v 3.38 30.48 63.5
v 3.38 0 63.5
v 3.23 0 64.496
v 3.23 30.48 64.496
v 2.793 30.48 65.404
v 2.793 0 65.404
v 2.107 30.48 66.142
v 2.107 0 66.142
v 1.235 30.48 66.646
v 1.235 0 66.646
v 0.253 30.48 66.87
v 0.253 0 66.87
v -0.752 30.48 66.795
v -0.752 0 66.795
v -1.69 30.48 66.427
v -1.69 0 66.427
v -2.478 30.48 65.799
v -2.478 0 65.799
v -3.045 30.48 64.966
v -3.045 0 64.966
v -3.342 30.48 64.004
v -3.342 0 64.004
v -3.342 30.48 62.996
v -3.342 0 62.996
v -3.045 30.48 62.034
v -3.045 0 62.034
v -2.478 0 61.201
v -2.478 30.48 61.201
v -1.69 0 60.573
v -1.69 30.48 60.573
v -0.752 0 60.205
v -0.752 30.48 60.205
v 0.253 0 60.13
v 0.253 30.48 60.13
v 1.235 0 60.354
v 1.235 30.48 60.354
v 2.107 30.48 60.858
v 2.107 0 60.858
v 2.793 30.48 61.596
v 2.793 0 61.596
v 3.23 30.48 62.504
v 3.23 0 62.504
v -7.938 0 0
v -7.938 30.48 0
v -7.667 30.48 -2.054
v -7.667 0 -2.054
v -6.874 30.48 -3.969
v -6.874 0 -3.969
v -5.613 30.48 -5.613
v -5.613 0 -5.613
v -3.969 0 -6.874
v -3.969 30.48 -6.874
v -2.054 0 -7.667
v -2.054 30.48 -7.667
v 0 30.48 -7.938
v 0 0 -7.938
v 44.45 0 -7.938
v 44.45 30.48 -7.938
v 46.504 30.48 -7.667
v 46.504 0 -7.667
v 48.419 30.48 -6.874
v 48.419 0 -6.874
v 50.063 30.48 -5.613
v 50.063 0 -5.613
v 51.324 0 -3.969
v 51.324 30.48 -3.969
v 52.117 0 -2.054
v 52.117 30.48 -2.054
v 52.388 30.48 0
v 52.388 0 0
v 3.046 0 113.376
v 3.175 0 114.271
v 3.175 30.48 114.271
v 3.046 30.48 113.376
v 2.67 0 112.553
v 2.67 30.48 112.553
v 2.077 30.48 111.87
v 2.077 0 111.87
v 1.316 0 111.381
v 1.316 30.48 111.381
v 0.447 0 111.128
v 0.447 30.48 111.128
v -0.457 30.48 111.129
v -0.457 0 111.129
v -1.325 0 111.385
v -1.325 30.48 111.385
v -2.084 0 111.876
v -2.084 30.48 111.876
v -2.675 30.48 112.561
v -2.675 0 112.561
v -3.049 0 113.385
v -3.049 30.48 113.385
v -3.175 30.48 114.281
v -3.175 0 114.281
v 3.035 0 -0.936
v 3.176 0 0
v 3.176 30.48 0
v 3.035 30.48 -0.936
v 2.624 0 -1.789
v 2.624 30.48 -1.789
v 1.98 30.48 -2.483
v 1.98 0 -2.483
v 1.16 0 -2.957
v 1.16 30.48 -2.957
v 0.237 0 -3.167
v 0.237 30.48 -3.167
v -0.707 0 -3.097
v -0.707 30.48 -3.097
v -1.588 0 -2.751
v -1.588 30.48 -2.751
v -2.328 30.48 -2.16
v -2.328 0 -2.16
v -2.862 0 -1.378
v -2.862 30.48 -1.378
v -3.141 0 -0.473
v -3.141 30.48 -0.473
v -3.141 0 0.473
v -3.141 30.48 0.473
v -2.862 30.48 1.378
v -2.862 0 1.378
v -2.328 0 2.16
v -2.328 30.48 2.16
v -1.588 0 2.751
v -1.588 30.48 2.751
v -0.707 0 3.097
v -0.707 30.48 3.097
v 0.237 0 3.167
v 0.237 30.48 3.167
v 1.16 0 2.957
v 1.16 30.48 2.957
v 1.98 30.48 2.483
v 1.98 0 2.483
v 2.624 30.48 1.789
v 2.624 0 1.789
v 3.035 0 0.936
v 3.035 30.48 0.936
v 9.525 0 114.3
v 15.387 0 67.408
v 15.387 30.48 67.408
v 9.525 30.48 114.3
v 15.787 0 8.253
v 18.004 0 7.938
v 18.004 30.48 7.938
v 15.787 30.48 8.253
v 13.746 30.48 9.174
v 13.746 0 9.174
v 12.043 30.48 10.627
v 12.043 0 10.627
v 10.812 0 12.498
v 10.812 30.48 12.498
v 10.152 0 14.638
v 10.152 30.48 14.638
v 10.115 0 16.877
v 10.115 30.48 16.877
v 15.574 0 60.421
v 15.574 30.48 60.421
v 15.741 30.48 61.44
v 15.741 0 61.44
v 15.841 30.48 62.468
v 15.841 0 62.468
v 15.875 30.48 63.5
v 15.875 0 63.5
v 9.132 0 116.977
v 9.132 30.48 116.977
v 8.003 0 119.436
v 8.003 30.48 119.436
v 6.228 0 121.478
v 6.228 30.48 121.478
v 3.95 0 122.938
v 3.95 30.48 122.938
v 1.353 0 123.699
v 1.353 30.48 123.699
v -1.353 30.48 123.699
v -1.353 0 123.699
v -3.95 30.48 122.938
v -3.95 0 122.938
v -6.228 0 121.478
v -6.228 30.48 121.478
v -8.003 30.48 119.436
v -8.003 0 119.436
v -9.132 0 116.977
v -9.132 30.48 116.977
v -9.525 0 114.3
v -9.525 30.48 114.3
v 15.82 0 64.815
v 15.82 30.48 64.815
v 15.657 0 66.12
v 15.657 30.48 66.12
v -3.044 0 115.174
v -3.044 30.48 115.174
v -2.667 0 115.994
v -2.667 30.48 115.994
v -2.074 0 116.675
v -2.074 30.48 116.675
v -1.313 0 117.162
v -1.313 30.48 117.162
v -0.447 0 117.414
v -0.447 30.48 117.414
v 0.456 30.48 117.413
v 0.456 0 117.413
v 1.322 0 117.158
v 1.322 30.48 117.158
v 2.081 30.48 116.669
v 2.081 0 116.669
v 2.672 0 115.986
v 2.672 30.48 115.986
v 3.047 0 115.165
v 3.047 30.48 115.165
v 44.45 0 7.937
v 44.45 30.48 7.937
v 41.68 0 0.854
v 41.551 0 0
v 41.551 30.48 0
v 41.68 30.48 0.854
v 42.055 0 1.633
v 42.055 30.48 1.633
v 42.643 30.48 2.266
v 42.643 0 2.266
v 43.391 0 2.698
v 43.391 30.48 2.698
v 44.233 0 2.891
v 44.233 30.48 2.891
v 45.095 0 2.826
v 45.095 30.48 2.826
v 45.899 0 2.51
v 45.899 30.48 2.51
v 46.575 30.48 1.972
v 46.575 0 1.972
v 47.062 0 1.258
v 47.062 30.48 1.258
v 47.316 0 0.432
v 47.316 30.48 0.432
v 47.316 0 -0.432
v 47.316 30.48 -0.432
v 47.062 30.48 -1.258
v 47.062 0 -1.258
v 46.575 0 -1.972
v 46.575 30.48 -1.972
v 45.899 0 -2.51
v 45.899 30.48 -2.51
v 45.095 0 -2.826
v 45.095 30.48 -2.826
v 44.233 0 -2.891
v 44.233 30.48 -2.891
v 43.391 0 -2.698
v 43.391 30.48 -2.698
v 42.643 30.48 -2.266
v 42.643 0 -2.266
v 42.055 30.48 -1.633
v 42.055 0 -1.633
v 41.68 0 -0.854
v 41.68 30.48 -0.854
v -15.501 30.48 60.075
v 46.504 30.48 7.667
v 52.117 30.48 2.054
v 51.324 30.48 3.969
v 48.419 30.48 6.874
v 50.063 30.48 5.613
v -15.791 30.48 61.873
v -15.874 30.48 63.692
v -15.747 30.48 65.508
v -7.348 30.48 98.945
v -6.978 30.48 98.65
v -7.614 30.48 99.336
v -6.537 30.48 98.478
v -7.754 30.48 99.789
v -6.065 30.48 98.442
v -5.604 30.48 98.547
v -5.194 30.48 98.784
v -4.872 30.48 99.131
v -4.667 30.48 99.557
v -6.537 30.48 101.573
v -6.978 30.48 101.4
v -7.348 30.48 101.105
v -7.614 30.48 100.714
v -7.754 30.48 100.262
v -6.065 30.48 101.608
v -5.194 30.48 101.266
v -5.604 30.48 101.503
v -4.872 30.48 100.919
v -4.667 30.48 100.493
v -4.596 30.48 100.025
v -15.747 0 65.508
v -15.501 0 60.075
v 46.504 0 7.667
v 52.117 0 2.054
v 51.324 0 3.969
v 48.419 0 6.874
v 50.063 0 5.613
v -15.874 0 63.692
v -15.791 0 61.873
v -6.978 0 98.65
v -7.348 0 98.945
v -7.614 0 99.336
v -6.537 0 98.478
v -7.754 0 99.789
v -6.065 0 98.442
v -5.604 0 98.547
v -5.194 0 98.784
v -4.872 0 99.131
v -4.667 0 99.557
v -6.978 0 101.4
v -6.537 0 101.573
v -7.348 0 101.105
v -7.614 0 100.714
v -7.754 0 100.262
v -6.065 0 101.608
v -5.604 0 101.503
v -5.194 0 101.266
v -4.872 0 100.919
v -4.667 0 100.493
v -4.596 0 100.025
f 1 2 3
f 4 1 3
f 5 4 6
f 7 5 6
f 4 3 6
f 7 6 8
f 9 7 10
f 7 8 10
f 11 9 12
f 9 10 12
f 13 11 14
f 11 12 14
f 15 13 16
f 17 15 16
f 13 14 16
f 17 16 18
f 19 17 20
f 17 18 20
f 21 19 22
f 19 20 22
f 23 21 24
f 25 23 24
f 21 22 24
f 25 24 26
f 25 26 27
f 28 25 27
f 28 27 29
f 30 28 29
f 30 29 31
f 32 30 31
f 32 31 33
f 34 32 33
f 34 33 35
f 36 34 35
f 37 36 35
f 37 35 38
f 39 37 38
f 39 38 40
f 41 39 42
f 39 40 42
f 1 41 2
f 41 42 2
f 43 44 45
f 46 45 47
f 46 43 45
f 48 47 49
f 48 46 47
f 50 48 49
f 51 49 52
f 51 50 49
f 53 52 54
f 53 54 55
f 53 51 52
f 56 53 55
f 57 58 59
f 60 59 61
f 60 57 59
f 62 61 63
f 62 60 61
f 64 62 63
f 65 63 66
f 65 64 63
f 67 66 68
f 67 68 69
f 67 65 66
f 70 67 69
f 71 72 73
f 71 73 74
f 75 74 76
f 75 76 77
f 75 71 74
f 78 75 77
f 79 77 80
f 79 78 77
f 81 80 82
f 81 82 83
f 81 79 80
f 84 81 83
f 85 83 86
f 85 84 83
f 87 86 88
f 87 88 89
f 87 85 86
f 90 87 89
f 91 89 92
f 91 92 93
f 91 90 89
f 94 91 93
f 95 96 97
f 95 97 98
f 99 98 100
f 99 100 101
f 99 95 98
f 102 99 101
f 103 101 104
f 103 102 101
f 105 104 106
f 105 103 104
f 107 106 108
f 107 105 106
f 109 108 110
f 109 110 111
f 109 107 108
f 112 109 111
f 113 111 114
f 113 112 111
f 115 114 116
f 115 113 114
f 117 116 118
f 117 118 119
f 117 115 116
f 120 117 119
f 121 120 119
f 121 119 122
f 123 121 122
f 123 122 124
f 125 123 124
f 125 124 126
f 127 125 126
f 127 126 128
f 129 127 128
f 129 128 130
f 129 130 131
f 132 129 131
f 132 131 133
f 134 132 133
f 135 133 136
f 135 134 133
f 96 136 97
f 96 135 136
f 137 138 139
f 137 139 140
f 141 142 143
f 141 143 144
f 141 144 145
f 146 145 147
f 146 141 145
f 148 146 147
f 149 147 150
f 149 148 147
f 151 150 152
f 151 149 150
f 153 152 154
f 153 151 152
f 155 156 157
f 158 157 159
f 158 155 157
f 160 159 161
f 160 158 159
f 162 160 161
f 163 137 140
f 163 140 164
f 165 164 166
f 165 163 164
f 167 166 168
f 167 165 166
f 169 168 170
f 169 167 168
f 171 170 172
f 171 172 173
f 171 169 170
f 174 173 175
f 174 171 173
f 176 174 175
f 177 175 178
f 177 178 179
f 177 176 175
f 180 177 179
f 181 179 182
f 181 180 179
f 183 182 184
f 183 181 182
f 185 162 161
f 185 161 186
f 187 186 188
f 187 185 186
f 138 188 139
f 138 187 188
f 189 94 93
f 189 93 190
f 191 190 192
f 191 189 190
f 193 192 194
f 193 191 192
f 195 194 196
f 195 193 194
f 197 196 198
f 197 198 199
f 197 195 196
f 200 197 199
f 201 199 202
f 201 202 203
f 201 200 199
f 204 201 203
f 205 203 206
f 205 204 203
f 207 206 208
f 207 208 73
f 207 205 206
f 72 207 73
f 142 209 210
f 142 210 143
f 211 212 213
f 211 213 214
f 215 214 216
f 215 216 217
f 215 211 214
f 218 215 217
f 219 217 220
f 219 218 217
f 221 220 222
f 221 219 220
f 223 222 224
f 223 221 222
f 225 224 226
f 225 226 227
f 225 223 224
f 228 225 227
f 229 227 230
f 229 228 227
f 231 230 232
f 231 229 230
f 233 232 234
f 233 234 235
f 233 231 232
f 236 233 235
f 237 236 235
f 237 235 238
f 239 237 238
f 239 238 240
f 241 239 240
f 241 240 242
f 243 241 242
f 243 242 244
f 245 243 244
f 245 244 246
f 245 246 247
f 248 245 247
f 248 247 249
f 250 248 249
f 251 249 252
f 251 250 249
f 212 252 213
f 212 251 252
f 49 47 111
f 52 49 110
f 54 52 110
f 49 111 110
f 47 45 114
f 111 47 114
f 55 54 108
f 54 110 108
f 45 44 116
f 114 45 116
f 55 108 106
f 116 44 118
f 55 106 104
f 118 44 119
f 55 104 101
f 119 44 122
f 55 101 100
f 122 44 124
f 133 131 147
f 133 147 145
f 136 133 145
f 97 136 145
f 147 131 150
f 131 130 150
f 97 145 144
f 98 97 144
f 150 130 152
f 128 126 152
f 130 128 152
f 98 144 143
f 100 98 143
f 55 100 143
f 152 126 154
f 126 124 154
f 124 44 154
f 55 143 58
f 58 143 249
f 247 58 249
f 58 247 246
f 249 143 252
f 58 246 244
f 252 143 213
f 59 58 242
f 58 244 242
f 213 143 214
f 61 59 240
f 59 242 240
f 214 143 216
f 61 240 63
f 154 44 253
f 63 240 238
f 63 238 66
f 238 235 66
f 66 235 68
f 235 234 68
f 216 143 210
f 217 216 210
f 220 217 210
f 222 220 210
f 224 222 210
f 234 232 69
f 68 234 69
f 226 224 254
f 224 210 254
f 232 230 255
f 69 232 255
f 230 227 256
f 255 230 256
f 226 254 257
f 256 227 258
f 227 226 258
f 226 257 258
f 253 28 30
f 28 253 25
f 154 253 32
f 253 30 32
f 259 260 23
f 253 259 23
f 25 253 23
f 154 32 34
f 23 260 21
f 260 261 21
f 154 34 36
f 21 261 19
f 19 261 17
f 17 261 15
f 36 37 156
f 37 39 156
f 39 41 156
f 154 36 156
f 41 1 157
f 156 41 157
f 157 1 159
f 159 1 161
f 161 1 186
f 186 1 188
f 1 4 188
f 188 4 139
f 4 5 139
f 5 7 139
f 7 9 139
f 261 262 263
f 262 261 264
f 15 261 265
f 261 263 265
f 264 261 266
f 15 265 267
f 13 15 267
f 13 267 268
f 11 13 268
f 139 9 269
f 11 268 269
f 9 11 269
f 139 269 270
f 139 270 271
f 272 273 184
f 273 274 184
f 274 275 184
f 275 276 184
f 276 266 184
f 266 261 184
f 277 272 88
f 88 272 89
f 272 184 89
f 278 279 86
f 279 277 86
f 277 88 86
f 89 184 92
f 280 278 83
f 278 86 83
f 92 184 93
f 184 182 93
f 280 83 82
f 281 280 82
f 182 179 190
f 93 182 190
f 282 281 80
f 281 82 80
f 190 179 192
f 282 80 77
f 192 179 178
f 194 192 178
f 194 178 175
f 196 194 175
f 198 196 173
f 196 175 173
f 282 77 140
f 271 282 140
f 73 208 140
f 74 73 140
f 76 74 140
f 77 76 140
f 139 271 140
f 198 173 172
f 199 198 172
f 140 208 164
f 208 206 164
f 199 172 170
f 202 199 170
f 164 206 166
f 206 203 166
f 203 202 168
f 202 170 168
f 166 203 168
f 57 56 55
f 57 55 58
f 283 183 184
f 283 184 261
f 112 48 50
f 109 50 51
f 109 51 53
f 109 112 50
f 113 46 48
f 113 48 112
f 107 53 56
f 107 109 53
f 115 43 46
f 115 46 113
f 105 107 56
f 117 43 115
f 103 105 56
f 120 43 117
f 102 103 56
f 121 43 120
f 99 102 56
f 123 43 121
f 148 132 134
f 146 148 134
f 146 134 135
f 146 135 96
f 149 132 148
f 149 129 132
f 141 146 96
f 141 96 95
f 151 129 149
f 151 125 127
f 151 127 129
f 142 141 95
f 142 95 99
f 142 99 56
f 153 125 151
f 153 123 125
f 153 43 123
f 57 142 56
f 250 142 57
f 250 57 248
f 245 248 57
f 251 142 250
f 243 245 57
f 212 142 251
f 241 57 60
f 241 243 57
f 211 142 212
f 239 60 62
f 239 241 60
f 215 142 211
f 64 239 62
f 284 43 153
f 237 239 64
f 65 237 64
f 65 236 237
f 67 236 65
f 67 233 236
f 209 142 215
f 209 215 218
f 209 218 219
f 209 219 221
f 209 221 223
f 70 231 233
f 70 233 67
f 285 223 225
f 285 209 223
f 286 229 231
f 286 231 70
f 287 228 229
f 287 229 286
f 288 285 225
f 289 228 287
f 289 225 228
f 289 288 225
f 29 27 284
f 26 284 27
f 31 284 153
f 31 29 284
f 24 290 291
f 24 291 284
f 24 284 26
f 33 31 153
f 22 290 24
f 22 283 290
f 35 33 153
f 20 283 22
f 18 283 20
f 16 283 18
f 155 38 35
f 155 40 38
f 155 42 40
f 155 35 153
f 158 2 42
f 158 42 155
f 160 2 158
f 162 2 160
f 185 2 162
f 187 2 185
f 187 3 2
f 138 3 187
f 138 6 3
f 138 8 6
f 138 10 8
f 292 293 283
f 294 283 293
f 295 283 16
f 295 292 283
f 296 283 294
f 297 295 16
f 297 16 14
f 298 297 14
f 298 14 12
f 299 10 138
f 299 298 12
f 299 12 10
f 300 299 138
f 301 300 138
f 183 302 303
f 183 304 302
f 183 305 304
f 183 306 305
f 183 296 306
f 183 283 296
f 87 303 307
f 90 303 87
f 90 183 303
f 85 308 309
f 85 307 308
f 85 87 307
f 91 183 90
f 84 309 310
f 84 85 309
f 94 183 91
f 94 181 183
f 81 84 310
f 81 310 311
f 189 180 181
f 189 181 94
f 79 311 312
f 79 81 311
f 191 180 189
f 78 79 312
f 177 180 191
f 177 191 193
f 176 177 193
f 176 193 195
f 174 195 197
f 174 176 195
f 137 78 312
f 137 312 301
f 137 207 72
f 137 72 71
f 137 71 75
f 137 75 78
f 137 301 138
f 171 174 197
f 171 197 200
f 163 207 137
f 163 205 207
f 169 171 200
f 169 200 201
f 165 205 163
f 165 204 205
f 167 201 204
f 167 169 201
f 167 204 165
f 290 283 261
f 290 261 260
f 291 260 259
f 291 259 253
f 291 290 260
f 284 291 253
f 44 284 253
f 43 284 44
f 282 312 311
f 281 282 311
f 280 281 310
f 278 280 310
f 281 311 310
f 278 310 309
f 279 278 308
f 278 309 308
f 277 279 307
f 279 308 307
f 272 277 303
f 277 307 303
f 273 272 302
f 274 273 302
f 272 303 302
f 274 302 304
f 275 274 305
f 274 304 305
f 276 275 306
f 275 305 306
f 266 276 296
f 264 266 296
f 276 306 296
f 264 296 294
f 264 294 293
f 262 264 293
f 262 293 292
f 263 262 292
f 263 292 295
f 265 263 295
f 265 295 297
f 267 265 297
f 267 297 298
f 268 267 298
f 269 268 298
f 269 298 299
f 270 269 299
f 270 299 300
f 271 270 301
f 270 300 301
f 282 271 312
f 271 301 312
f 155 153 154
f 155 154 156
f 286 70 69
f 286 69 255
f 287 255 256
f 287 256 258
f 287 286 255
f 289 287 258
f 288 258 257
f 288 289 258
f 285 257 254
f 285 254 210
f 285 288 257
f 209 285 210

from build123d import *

# Parameters (mm, degrees)
F0_R     = 3.3798618289
F0_R_2   = 1.5875
F1_DEPTH = 30.48


with BuildPart() as f1:
    # F0 (on Front) → F1 (new body)
    with BuildSketch(Plane.XZ):
        with BuildLine():
            ThreePointArc((-3.1763056217, 0), (0, 3.1763056217), (3.1763056217, 0))
            Line((3.1763056217, 0), (7.9375, 0))
            ThreePointArc((7.9375, 0), (0, 7.9375), (-7.9375, 0))
            Line((-7.9375, 0), (-3.1763056217, 0))
        make_face()
        with BuildLine():
            Line((7.9375, 0), (3.1763056217, 0))
            ThreePointArc((3.1763056217, 0), (0, -3.1763056217), (-3.1763056217, 0))
            Line((-3.1763056217, 0), (-7.9375, 0))
            ThreePointArc((-7.9375, 0), (-5.6126600757, -5.6126600757), (0, -7.9375))
            ThreePointArc((0, -7.9375), (5.6126600757, -5.6126600757), (7.9375, 0))
        make_face()
        with BuildLine():
            ThreePointArc((-7.9375, 0), (0, 7.9375), (7.9375, 0))
            Line((7.9375, 0), (36.5125, 0))
            ThreePointArc((36.5125, 0), (38.8373399243, 5.6126600757), (44.45, 7.9375))
            Line((44.45, 7.9375), (18.003602441, 7.9375))
            ThreePointArc((18.003602441, 7.9375), (12.0425977283, 10.6272719893), (10.1151377075, 16.876539819))
            Line((10.1151377075, 16.876539819), (15.5735553324, 60.4210392487))
            ThreePointArc((15.5735553324, 60.4210392487), (0.1766226081, 47.6259825673), (-15.5011920437, 60.0752853808))
            Line((-15.5011920437, 60.0752853808), (-7.9375, 0))
        make_face()
        with BuildLine():
            Line((36.5125, 0), (7.9375, 0))
            ThreePointArc((7.9375, 0), (5.6126600757, -5.6126600757), (0, -7.9375))
            Line((0, -7.9375), (44.45, -7.9375))
            ThreePointArc((44.45, -7.9375), (38.8373399243, -5.6126600757), (36.5125, 0))
        make_face()
        with BuildLine():
            ThreePointArc((44.45, 7.9375), (38.8373399243, 5.6126600757), (36.5125, 0))
            ThreePointArc((36.5125, 0), (38.8373399243, -5.6126600757), (44.45, -7.9375))
            ThreePointArc((44.45, -7.9375), (50.0626600757, -5.6126600757), (52.3875, 0))
            ThreePointArc((52.3875, 0), (50.0626600757, 5.6126600757), (44.45, 7.9375))
        make_face()
        with BuildLine():
            ThreePointArc((47.3488403966, 0), (44.45, -2.8988403966), (41.5511596034, 0))
            ThreePointArc((41.5511596034, 0), (44.45, 2.8988403966), (47.3488403966, 0))
        make_face(mode=Mode.SUBTRACT)
        with BuildLine():
            ThreePointArc((-15.7474550599, 65.5083037958), (-15.8587171211, 62.7811702055), (-15.5011920437, 60.0752853808))
            ThreePointArc((-15.5011920437, 60.0752853808), (0.1766226081, 47.6259825673), (15.5735553324, 60.4210392487))
            ThreePointArc((15.5735553324, 60.4210392487), (15.7994591031, 61.9531590098), (15.875, 63.5))
            Line((15.875, 63.5), (15.3865317539, 67.407718719))
            ThreePointArc((15.3865317539, 67.407718719), (-0.9667009211, 79.3455392565), (-15.7474550599, 65.5083037958))
        make_face()
        with Locations((0, 63.5)):
            Circle(F0_R, mode=Mode.SUBTRACT)
        with BuildLine():
            Line((-9.5249557191, 114.3), (-15.7474550599, 65.5083037958))
            ThreePointArc((-15.7474550599, 65.5083037958), (-0.9667009211, 79.3455392565), (15.3865317539, 67.407718719))
            Line((15.3865317539, 67.407718719), (9.5249557191, 114.3))
            ThreePointArc((9.5249557191, 114.3), (9.5249889298, 114.2854780636), (9.525, 114.2709560934))
            ThreePointArc((9.525, 114.2709560934), (-0.0145219702, 104.7459671636), (-9.5249557191, 114.3))
        make_face()
        with Locations((-6.1838091351, 100.0252)):
            Circle(F0_R_2, mode=Mode.SUBTRACT)
        with BuildLine():
            Line((15.3865317539, 67.407718719), (15.875, 63.5))
            ThreePointArc((15.875, 63.5), (15.7524096029, 65.4690649313), (15.3865317539, 67.407718719))
        make_face()
        with BuildLine():
            ThreePointArc((9.5249557191, 114.3), (0, 123.7959560934), (-9.5249557191, 114.3))
            ThreePointArc((-9.5249557191, 114.3), (-0.0145219702, 104.7459671636), (9.525, 114.2709560934))
            ThreePointArc((9.525, 114.2709560934), (9.5249889298, 114.2854780636), (9.5249557191, 114.3))
        make_face()
        with BuildLine():
            ThreePointArc((3.175, 114.2709560934), (-0.0048406567, 111.0959597835), (-3.1749852397, 114.2806373956))
            ThreePointArc((-3.1749852397, 114.2806373956), (0.0048406567, 117.4459524033), (3.175, 114.2709560934))
        make_face(mode=Mode.SUBTRACT)
    extrude(amount=-F1_DEPTH)


solid = f1.part
